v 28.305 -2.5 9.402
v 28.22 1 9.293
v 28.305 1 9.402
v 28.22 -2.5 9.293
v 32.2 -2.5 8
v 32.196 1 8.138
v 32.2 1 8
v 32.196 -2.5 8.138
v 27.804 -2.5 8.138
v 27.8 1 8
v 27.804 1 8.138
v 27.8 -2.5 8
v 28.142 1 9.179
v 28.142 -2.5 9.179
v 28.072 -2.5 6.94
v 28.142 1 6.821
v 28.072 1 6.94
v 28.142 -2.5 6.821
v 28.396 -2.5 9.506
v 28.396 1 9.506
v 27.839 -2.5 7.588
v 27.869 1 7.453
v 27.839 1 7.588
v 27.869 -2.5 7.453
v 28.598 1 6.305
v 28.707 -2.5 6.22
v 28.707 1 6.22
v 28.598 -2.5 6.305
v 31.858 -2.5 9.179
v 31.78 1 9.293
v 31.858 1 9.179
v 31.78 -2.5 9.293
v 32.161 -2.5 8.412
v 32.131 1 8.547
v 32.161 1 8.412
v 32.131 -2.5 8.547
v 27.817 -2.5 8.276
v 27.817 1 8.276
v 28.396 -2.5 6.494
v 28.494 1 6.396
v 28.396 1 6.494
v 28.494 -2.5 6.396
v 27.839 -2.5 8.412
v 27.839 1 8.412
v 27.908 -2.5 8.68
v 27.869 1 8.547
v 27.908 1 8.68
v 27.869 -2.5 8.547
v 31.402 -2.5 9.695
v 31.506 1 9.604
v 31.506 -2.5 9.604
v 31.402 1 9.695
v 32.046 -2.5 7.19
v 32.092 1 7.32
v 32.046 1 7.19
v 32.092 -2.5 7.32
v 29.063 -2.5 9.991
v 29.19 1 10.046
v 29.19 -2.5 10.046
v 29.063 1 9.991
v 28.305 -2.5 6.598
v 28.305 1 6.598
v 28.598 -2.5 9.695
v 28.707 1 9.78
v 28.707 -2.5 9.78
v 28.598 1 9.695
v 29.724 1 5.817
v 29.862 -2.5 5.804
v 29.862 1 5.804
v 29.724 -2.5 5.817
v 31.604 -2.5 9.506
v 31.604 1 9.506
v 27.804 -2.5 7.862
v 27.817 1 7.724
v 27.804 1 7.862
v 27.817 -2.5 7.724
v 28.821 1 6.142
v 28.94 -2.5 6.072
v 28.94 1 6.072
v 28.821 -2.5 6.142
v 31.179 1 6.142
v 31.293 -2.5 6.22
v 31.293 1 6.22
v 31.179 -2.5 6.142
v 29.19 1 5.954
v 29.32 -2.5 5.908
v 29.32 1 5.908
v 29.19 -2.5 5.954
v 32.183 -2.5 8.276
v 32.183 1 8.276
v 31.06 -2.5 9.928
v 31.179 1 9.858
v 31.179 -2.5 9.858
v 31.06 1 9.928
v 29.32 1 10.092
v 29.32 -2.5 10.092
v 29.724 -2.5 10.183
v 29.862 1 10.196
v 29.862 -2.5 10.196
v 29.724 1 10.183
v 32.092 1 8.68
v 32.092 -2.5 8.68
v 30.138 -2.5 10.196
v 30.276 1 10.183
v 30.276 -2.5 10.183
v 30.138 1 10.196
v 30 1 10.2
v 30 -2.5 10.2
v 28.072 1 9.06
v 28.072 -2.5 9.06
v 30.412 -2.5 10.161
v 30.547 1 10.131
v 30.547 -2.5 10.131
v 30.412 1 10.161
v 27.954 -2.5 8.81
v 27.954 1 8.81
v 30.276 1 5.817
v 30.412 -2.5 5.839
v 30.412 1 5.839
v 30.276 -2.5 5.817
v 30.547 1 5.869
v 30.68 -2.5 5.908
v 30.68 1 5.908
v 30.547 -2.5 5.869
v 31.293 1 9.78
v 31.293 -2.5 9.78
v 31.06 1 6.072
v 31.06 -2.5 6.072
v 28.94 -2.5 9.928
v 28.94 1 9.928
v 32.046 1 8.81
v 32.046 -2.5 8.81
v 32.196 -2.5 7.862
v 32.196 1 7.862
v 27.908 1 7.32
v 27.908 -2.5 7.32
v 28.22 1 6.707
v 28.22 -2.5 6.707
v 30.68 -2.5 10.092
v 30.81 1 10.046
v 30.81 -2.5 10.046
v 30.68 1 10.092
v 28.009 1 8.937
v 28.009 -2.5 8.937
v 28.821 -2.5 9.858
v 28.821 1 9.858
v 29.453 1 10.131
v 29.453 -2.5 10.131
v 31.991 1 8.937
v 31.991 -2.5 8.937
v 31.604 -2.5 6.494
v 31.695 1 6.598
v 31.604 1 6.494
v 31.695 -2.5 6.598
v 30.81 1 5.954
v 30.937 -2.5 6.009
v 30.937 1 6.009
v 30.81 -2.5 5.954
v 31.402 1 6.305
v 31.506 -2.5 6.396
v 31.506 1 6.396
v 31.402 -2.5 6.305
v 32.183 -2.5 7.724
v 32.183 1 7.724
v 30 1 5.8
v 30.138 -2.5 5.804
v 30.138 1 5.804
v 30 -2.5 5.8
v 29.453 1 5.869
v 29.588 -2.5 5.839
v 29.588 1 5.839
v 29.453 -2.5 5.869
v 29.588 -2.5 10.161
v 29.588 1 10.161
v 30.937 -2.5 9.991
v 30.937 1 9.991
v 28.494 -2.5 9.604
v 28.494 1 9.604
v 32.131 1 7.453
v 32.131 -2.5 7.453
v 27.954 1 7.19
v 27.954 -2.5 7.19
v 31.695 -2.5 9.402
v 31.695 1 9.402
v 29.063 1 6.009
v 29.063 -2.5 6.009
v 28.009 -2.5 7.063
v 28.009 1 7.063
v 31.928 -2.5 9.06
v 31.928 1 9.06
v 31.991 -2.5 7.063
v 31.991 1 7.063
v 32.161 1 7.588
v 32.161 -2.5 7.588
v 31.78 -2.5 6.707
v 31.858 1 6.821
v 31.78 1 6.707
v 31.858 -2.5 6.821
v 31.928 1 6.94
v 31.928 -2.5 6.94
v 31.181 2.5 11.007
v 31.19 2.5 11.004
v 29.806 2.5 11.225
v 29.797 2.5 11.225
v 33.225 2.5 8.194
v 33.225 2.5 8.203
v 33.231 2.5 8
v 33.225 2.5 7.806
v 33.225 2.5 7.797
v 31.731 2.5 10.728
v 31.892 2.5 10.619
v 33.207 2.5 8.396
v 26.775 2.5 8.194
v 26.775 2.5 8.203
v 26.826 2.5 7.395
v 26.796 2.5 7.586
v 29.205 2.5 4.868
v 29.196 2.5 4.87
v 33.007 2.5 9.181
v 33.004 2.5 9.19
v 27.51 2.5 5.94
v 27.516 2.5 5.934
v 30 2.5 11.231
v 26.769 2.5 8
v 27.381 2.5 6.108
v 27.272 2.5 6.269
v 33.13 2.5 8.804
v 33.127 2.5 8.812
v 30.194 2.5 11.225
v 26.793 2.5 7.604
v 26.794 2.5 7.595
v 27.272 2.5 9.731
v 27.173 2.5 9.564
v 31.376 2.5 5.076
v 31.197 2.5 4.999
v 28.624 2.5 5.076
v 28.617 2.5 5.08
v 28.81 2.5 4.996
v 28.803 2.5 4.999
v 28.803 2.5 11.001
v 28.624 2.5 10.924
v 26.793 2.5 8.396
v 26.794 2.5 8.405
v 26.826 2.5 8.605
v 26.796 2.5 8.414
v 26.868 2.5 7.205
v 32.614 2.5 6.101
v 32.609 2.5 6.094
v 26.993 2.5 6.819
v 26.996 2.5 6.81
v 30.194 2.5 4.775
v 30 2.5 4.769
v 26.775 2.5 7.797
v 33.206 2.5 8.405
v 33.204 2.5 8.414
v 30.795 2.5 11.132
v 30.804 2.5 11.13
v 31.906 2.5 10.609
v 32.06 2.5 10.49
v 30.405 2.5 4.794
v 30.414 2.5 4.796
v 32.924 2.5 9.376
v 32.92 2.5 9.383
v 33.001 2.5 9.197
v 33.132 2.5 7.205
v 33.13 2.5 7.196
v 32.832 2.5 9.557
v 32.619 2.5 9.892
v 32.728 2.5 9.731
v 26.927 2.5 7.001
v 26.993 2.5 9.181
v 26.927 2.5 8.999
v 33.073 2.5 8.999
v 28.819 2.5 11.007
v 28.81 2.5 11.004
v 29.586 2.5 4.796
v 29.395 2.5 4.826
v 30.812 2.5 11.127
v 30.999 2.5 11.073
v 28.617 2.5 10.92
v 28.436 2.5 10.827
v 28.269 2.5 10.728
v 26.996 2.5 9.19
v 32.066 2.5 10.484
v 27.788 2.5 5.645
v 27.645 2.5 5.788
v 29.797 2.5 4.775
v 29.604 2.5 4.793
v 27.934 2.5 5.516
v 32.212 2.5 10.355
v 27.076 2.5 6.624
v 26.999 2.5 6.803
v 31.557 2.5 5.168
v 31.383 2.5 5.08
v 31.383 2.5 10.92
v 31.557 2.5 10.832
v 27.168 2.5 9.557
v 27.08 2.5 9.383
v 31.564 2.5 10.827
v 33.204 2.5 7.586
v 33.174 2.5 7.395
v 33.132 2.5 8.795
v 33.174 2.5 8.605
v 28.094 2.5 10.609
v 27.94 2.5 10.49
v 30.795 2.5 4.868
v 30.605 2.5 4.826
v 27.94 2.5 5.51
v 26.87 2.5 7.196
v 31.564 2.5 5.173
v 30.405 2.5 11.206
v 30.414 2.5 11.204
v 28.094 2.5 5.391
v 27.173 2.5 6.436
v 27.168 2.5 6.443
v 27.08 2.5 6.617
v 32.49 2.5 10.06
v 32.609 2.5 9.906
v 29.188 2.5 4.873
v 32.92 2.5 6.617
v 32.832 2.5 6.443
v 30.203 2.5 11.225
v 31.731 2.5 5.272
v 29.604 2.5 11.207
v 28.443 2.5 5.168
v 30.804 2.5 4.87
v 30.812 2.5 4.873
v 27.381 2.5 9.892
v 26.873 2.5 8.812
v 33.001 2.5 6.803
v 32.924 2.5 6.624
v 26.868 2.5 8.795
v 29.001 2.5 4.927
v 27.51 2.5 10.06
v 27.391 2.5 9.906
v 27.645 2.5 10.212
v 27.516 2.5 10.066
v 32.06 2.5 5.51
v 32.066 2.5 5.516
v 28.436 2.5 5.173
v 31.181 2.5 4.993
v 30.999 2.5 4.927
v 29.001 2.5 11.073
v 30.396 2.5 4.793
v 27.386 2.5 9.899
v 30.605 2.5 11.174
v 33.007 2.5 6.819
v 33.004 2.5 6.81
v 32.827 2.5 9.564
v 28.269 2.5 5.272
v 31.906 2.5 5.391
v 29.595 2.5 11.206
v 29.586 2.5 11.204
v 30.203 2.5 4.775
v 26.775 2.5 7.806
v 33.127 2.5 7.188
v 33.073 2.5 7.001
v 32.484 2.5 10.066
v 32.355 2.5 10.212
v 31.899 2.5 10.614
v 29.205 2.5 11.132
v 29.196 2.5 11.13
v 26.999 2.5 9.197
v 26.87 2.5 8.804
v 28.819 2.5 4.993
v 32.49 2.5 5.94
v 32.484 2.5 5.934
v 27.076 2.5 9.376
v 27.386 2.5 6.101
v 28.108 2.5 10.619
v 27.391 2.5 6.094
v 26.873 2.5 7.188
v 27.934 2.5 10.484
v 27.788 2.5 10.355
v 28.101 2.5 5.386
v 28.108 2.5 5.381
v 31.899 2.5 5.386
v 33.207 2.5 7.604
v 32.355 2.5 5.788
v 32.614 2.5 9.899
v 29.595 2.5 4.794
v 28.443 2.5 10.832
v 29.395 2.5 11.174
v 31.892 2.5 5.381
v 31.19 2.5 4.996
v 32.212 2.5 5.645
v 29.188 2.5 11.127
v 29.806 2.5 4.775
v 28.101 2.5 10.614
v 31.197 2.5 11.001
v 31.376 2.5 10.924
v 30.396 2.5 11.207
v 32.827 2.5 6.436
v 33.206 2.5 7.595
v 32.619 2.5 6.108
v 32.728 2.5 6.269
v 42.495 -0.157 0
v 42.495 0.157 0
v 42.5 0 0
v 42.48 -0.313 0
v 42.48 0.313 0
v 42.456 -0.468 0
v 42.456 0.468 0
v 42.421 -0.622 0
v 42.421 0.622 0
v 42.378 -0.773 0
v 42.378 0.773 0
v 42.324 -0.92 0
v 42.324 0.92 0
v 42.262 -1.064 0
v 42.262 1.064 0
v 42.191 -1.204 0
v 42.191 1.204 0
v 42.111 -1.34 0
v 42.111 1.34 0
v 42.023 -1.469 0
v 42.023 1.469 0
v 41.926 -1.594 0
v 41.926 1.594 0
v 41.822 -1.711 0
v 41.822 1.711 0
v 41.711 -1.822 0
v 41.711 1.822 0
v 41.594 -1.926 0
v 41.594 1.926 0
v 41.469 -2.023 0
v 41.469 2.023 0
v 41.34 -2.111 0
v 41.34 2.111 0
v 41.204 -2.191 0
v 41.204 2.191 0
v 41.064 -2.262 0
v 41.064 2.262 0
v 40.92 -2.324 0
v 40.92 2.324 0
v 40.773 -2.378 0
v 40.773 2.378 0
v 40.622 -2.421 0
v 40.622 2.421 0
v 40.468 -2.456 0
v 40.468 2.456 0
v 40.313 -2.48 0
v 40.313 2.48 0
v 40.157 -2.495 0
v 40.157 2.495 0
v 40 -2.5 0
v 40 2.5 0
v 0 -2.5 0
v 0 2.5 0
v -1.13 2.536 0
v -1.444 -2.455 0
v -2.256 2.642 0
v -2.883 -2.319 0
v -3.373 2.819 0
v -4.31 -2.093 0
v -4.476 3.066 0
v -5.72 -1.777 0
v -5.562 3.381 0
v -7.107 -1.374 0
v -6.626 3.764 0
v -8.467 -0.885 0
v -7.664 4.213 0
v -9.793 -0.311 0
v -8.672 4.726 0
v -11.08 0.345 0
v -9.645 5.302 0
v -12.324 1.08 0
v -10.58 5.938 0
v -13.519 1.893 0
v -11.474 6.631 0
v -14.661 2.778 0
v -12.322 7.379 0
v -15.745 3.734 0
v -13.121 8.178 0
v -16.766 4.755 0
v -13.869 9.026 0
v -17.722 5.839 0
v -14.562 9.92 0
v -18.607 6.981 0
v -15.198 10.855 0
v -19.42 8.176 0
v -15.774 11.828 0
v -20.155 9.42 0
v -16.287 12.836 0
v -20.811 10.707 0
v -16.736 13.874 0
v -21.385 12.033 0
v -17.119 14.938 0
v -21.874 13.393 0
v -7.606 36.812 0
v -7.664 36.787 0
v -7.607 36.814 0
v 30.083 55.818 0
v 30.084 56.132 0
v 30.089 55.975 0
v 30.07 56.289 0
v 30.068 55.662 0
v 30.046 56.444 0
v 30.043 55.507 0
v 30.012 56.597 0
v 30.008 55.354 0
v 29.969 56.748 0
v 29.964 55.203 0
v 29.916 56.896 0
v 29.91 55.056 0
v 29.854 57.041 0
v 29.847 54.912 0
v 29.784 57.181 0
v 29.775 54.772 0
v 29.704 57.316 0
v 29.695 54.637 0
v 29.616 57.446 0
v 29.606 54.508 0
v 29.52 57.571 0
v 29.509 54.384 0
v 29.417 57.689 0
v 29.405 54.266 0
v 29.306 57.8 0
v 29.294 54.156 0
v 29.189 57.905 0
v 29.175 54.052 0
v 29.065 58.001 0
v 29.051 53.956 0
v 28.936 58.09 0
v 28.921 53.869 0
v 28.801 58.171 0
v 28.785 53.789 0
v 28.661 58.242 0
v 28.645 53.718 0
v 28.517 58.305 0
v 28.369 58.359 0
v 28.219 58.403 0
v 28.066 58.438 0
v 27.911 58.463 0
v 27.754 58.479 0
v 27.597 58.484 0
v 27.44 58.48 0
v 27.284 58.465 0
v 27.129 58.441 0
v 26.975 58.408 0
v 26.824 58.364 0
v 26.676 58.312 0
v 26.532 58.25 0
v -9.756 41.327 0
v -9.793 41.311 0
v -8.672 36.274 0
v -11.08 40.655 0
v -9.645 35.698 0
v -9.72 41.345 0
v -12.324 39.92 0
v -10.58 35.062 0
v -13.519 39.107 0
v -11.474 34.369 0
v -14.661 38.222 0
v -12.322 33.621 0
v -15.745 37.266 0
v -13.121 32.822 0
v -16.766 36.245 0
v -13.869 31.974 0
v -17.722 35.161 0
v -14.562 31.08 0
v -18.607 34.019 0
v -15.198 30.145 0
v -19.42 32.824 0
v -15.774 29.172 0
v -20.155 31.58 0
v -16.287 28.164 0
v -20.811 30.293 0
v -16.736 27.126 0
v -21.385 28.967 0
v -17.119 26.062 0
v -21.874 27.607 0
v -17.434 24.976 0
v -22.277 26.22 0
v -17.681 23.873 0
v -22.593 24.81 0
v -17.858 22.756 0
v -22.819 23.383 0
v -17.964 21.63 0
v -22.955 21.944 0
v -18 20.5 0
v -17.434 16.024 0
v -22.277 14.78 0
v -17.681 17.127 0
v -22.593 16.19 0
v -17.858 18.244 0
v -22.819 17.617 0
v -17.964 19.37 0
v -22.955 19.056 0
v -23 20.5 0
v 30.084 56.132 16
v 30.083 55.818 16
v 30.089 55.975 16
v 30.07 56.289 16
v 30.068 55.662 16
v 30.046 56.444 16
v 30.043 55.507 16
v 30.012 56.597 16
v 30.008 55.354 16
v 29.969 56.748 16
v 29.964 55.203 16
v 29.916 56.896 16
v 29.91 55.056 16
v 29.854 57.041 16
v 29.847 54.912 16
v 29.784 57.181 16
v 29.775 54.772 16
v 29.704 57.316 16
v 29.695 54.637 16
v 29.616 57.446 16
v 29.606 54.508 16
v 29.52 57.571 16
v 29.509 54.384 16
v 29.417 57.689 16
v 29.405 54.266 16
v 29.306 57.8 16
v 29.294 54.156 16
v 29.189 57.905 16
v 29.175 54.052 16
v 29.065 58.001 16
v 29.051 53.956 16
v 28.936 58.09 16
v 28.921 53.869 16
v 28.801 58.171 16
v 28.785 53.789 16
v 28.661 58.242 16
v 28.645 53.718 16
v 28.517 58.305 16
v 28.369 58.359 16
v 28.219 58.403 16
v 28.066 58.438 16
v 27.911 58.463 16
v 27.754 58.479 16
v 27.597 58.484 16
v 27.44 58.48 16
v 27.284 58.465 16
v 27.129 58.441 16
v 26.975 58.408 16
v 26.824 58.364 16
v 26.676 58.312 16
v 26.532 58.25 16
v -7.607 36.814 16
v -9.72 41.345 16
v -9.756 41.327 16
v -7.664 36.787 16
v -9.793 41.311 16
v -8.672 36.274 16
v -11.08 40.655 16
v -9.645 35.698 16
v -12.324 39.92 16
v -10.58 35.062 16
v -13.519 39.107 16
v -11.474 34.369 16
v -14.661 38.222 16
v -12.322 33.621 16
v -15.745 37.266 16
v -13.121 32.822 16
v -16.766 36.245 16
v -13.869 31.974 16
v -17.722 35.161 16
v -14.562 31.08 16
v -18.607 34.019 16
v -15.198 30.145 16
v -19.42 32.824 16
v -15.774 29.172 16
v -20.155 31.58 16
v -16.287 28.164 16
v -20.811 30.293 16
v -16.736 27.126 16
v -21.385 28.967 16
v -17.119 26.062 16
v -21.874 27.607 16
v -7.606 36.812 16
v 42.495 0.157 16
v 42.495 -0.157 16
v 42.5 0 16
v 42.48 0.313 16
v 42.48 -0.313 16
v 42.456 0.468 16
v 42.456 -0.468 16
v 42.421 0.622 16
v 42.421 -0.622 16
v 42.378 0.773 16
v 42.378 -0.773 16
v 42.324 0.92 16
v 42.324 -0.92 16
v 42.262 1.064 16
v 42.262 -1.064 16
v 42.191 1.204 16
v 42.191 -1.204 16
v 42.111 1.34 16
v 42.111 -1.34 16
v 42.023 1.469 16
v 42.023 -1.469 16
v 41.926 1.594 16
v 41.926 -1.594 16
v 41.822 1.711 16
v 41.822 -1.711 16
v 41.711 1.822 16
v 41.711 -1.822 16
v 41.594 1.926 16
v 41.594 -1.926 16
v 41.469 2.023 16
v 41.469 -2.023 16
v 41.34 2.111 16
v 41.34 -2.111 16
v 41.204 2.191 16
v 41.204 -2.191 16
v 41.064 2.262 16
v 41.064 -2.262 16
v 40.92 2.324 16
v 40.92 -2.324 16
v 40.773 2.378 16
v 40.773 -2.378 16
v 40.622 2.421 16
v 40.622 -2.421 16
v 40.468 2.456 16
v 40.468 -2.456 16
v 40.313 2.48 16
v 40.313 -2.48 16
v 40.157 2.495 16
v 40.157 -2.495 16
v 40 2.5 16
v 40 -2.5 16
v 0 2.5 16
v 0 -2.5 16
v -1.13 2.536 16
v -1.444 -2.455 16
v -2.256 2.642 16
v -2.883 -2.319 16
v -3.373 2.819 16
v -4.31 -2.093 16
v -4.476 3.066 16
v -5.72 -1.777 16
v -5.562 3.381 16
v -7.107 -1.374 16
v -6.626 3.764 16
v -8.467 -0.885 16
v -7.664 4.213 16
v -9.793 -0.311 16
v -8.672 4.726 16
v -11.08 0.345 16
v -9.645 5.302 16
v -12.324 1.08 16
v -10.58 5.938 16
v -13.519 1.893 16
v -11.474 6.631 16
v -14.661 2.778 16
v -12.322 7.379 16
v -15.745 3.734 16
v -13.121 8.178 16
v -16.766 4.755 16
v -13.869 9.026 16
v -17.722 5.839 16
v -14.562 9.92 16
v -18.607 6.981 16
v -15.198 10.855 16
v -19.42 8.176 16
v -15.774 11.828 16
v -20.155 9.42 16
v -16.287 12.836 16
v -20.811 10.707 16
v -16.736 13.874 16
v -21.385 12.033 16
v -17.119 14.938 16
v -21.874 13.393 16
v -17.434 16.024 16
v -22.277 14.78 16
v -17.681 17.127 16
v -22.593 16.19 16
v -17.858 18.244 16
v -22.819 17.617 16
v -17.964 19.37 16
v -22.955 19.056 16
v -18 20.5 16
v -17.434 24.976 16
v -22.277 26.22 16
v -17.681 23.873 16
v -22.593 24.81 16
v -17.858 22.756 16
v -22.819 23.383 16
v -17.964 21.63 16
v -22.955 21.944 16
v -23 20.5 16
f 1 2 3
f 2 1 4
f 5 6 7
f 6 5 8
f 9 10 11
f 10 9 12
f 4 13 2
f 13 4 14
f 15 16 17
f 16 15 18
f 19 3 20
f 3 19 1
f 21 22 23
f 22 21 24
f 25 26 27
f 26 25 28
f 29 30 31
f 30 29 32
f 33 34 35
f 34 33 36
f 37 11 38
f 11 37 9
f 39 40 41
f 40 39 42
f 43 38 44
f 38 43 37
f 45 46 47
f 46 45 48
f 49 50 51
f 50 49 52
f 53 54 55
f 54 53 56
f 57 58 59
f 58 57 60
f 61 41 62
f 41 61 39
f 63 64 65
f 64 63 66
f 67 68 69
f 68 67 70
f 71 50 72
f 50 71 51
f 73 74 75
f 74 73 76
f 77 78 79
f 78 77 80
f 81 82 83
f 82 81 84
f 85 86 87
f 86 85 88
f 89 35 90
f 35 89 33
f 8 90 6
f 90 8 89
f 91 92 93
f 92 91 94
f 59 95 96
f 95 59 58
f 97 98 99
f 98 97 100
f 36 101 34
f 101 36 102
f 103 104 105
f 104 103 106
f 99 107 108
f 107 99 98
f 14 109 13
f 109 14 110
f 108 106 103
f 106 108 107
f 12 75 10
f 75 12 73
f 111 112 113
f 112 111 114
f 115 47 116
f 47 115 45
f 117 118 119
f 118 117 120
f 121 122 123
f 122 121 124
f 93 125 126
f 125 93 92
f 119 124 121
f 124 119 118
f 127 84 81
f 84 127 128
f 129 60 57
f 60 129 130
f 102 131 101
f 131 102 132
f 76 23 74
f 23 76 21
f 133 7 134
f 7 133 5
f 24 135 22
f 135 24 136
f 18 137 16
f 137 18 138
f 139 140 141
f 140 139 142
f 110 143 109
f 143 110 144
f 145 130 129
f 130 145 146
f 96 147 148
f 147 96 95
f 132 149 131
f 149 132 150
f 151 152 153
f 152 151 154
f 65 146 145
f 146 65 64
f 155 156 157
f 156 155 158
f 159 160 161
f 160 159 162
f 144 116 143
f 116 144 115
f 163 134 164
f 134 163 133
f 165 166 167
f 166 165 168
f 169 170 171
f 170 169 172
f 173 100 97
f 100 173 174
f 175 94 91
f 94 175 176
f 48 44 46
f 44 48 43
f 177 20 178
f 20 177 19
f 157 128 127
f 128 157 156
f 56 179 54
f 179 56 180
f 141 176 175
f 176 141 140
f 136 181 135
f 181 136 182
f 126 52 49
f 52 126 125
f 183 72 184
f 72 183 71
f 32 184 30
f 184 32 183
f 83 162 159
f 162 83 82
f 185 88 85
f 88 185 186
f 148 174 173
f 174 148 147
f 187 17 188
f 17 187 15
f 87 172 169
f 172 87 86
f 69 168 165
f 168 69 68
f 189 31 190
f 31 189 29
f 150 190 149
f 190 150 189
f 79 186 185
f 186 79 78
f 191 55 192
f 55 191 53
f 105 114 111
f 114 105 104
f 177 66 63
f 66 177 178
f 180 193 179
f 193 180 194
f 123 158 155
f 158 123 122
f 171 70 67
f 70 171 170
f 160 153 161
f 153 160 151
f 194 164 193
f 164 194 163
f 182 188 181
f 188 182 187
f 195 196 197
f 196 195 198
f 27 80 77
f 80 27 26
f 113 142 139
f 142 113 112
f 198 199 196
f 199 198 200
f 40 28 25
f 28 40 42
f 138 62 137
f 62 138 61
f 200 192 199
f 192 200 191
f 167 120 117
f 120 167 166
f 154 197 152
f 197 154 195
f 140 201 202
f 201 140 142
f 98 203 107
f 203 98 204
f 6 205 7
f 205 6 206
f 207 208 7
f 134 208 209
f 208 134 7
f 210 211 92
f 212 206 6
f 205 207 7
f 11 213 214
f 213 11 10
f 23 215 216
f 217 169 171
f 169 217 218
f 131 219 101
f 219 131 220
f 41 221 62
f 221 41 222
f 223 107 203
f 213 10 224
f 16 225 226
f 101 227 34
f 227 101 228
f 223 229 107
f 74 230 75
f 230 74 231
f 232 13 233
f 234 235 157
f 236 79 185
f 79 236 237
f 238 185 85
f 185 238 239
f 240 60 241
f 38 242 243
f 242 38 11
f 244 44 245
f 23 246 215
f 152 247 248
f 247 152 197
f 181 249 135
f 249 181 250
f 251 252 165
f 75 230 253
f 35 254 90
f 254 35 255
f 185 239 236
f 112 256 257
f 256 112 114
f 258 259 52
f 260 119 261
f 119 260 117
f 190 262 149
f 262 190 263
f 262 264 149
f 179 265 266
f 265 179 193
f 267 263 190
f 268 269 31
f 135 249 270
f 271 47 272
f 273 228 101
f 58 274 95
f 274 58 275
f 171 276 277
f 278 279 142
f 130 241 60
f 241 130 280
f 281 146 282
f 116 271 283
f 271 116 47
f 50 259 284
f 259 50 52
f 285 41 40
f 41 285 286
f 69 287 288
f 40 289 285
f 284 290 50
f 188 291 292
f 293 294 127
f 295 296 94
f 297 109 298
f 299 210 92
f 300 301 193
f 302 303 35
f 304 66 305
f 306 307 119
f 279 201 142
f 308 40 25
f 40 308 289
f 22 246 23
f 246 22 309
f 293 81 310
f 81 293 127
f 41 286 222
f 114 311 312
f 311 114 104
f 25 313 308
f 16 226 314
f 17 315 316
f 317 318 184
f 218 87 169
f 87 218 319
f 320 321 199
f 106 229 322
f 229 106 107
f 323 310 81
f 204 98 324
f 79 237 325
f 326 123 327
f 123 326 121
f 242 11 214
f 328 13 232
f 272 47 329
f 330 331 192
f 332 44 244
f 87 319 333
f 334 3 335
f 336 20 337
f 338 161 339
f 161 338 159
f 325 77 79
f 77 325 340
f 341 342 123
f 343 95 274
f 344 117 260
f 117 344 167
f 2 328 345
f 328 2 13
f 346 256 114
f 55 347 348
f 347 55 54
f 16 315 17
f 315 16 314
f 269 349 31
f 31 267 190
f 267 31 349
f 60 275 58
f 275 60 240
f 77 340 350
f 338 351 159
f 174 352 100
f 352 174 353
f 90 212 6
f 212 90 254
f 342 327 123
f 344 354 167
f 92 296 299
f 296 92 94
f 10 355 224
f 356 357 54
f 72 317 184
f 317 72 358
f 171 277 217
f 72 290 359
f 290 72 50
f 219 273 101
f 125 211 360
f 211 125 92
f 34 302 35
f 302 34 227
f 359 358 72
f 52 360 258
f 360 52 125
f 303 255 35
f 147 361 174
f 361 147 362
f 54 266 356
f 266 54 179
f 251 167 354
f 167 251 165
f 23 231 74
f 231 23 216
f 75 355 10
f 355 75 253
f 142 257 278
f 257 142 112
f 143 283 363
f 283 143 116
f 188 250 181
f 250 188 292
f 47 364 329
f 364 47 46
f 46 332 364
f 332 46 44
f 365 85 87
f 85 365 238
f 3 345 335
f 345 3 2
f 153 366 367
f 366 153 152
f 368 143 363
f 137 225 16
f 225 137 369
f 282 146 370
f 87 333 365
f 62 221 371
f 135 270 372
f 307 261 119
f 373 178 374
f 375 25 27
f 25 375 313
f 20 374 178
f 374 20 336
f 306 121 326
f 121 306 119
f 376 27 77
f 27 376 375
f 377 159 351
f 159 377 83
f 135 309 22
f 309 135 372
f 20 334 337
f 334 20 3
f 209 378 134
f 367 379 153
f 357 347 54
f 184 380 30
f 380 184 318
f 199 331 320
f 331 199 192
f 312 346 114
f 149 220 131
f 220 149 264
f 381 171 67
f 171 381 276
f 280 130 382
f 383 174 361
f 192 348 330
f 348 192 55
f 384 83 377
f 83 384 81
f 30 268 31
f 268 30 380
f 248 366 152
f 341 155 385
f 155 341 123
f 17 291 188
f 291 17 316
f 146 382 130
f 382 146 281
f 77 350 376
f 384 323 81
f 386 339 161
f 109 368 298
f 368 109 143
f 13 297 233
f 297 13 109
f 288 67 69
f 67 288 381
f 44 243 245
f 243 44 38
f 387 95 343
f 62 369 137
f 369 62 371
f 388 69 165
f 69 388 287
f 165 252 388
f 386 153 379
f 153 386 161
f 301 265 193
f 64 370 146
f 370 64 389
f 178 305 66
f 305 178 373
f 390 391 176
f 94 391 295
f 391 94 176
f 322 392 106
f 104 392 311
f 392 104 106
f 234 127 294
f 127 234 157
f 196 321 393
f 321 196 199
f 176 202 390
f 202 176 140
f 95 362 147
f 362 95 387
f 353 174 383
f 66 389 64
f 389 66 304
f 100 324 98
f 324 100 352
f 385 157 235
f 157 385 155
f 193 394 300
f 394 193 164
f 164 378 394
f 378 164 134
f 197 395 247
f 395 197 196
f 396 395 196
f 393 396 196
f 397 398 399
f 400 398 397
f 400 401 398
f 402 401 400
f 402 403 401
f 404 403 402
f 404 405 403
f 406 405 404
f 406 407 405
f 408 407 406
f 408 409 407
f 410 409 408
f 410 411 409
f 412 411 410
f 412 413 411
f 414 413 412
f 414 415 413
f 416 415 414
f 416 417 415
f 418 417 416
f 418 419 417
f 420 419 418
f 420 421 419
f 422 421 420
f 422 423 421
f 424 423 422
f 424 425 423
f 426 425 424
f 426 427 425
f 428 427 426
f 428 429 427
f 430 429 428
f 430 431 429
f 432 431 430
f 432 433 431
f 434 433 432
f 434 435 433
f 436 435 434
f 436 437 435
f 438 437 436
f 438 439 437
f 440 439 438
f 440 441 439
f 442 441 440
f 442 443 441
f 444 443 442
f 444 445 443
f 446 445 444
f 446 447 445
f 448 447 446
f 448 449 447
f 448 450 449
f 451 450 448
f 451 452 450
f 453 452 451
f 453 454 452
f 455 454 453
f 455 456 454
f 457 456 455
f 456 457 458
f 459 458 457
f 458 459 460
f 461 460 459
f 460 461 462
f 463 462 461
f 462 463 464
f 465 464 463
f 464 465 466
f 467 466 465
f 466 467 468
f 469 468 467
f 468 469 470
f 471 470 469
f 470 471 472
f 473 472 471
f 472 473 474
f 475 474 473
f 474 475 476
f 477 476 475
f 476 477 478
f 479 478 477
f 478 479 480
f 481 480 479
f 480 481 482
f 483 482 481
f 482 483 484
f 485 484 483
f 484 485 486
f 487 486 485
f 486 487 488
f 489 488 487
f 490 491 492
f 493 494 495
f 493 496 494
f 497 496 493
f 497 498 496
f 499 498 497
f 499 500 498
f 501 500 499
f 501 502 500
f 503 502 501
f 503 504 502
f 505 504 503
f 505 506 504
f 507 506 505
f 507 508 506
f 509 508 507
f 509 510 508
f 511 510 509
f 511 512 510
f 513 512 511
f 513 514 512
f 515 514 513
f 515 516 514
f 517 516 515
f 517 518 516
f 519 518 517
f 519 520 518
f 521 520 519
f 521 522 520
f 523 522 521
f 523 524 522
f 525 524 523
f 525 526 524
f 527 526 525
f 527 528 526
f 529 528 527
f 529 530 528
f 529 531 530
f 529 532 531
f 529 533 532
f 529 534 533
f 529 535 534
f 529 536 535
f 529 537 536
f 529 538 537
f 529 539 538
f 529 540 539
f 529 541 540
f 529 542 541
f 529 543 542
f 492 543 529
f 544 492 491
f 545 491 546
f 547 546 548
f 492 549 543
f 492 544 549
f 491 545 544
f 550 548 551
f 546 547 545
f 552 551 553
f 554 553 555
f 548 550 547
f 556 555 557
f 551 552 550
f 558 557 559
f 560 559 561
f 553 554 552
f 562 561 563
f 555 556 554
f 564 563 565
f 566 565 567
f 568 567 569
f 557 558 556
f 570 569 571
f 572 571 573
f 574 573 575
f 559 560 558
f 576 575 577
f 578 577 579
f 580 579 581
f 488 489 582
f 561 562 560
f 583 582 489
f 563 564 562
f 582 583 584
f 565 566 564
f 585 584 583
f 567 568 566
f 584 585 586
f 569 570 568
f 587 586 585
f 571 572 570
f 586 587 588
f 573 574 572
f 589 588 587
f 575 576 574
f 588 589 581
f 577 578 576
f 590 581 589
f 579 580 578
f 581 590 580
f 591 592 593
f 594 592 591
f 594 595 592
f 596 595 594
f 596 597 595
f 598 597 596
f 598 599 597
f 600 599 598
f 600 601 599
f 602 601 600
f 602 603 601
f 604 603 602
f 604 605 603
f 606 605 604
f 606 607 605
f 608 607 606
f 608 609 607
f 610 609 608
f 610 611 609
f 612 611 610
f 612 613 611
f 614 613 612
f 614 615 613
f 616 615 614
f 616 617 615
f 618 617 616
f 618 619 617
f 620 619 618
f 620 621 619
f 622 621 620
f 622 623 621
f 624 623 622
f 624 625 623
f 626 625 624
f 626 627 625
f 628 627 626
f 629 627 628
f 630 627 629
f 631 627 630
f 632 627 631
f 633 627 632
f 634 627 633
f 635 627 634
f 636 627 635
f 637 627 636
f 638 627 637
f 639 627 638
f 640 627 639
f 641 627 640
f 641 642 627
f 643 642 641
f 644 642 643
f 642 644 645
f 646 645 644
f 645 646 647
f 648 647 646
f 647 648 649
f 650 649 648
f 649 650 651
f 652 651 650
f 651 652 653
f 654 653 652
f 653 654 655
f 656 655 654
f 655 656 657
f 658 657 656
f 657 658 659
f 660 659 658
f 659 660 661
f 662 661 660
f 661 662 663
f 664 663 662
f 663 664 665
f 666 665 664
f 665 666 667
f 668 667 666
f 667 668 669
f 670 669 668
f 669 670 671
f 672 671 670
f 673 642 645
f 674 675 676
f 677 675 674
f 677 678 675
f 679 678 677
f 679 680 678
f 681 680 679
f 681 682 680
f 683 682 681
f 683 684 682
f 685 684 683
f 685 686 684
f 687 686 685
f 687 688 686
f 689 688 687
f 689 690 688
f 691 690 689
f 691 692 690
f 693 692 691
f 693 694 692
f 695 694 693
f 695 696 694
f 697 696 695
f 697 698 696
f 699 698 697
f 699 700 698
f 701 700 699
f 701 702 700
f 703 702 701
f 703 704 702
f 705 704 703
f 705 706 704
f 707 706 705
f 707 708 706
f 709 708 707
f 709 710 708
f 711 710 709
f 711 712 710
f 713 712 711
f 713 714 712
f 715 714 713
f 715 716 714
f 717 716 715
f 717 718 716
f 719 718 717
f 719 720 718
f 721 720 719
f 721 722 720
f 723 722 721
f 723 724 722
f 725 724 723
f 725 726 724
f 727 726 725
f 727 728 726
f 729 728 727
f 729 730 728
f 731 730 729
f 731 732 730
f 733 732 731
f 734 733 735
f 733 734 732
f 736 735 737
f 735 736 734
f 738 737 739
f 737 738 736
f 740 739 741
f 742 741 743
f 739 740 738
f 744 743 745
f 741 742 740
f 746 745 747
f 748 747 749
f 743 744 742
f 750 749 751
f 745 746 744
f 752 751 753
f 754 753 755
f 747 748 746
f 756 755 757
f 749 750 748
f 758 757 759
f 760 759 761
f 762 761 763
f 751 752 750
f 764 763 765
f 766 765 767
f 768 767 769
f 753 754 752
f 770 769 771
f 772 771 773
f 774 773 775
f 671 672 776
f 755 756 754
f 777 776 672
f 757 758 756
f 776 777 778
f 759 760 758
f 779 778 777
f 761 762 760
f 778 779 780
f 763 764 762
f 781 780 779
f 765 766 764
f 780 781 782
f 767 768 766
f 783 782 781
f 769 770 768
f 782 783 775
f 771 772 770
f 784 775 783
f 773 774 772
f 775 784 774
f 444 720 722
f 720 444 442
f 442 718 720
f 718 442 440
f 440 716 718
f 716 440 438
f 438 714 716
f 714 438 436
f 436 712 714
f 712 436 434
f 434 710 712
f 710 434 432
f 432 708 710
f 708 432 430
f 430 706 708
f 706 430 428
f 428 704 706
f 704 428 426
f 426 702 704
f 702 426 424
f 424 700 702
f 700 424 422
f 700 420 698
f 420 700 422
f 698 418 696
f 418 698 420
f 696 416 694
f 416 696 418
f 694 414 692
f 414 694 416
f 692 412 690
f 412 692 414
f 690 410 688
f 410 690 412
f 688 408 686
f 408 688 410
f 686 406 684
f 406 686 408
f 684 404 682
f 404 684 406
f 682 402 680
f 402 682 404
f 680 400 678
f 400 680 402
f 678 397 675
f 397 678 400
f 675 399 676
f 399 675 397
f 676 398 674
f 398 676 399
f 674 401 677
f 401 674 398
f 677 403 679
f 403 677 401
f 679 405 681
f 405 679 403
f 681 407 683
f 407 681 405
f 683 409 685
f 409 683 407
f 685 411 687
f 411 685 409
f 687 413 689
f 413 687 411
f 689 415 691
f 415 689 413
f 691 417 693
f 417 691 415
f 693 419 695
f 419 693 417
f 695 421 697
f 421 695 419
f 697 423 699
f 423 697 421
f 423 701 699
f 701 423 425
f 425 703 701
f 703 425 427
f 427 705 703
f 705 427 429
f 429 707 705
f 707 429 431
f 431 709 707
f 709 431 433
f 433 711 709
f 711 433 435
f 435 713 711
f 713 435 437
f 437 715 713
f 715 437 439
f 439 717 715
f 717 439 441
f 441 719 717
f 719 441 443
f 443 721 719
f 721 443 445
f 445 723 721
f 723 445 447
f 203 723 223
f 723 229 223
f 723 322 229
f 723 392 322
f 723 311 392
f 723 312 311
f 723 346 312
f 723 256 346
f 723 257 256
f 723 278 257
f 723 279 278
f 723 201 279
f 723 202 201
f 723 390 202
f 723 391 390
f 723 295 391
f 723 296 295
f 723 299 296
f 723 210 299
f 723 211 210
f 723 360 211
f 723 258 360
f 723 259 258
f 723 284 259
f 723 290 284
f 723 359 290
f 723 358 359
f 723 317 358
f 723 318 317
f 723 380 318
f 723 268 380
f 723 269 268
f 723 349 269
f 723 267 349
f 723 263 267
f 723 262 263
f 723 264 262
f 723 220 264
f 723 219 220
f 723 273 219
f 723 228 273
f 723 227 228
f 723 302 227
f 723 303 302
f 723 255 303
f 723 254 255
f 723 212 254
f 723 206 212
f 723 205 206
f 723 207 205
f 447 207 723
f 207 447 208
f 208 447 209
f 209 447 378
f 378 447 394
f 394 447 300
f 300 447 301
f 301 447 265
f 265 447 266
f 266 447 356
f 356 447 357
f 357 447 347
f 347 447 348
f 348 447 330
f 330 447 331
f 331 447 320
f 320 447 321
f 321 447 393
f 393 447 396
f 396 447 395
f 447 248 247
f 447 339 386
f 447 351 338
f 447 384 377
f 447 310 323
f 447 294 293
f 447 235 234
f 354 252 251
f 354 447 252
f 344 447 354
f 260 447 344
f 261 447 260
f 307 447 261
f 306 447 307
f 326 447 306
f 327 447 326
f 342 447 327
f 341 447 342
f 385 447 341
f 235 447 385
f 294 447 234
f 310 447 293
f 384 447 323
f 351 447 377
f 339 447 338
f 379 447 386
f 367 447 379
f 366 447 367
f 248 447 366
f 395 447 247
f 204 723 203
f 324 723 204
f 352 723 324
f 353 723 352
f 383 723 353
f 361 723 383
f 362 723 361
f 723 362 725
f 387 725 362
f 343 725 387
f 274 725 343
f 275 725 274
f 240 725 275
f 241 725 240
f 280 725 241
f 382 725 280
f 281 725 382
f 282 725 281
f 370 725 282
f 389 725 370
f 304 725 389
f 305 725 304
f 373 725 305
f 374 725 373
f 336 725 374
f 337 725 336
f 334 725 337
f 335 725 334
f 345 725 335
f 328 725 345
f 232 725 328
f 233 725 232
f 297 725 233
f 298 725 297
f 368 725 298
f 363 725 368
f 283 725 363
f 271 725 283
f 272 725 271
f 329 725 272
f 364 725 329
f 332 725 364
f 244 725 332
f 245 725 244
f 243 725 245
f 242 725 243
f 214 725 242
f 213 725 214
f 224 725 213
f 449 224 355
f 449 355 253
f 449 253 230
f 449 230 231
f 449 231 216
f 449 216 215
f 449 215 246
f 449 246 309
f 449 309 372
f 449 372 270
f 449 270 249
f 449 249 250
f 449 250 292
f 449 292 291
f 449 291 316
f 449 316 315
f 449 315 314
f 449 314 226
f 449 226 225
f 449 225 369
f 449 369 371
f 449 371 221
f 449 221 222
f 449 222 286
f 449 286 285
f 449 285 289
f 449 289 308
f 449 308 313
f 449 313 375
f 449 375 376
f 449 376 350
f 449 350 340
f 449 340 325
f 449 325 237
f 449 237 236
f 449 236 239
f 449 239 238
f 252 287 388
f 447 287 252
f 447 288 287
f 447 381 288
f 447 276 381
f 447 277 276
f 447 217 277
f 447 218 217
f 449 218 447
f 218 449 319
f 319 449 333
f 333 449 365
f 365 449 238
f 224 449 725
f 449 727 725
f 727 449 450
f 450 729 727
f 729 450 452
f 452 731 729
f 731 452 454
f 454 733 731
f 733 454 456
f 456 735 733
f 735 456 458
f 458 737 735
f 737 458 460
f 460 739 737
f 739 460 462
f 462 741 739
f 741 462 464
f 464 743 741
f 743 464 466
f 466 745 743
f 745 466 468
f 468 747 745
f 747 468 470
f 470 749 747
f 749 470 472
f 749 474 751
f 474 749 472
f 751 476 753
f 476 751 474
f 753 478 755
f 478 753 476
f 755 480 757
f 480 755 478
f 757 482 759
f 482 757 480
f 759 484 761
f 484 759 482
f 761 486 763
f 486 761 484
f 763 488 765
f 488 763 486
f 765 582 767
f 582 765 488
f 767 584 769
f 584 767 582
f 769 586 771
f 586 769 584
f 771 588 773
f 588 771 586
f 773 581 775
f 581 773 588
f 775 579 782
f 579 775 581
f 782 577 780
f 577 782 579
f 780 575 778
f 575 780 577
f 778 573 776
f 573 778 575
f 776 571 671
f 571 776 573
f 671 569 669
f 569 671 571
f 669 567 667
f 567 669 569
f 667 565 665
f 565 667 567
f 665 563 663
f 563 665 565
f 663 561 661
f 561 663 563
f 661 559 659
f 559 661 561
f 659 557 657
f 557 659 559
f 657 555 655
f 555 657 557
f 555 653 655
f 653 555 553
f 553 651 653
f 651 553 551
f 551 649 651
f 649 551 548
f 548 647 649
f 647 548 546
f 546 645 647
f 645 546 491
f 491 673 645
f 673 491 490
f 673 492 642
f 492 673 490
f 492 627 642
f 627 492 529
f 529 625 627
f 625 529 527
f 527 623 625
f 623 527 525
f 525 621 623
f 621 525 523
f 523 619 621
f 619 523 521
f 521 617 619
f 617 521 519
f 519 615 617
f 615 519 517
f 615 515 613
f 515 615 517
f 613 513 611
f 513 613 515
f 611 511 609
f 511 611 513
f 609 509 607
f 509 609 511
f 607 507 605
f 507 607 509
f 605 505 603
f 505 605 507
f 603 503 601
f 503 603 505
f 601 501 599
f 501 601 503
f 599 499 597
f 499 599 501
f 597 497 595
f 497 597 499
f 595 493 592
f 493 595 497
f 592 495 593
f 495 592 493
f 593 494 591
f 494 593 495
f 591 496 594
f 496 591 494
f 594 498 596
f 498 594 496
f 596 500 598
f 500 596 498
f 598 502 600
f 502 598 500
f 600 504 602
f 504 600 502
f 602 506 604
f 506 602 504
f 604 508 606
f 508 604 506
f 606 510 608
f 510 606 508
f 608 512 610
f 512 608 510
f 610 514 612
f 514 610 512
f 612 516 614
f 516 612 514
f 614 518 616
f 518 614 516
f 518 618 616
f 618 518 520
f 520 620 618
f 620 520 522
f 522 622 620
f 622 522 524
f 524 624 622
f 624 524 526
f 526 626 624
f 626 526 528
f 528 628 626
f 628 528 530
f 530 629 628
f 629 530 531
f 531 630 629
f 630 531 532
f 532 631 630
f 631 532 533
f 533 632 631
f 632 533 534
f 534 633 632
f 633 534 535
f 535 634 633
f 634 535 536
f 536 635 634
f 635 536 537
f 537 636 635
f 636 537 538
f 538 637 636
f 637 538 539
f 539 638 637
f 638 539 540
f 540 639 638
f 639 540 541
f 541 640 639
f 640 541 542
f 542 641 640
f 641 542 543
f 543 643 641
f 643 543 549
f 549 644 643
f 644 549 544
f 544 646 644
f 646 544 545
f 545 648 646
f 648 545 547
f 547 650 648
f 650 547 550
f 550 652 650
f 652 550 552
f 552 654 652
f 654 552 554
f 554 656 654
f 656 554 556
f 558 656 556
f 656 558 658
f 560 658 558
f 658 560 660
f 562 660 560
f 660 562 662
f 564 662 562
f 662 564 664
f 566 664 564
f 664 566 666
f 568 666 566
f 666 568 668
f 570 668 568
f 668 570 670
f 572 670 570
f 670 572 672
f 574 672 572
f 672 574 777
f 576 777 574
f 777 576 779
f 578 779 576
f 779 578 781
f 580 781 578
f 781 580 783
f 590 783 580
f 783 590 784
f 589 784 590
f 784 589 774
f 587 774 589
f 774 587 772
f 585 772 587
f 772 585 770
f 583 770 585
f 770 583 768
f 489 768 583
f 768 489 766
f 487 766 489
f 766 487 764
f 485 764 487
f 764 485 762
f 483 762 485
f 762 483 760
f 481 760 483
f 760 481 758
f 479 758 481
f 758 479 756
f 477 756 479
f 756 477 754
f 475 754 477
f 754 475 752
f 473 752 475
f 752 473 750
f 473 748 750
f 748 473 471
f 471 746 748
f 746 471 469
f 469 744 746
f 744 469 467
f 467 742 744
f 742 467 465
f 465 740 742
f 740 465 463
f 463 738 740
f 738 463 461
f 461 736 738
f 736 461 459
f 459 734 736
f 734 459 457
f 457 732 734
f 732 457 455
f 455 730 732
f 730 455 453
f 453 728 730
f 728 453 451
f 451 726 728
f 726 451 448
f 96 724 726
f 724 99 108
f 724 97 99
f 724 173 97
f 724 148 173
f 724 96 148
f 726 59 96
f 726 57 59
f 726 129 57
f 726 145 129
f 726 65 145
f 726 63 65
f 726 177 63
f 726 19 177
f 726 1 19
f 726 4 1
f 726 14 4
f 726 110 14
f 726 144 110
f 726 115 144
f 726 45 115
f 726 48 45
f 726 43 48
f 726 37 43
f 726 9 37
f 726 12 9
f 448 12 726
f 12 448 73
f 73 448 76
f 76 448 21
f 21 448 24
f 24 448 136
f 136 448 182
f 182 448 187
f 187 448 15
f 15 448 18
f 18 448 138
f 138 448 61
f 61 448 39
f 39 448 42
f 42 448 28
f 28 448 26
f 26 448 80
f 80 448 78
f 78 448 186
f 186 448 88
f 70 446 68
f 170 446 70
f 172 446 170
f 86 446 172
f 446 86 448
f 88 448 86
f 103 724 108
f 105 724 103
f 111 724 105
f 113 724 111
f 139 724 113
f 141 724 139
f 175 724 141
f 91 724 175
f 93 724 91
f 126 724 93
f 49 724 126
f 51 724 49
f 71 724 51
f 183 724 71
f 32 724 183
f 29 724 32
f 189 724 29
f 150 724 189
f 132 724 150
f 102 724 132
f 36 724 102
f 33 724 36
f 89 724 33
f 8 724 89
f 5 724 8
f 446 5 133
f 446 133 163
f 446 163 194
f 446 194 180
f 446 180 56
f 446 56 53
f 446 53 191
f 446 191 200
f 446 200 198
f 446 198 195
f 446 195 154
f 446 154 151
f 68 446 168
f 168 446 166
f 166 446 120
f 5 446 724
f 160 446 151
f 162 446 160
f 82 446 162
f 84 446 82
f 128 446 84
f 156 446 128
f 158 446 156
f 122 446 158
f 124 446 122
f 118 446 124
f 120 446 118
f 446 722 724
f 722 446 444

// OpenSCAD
$fn=100;

thickness = 5;
pole_radius = 18;
screw_hole_radius = 2.2;
curve_angle = 25;
total_width = 16;

difference () {
  linear_extrude (total_width) {
    hull () {
      circle (thickness/2);
      translate ([40,0,0]) circle (thickness/2);
    }
    translate ([0,pole_radius + thickness/2,0])
    difference () {
      circle (pole_radius + thickness);
      circle (pole_radius);
      translate ([0,-50,0])
        square (100);
      rotate(curve_angle)
        square(100);
    }
    translate([0,pole_radius+thickness/2,0])
    rotate(curve_angle)
      hull () {
        translate ([0, pole_radius + thickness/2, 0]) circle(thickness/2);
        translate ([40, pole_radius + thickness/2, 0]) circle(thickness/2);
      }
  }
  
  translate ([30, 0, total_width/2])
  rotate ([270,0,0]) {
    translate ([0,0,-15]) linear_extrude (total_width)
      circle (screw_hole_radius);
    translate ([0,0,thickness/2 - 1.5])
    linear_extrude (1.6, scale=1.5)
      circle (screw_hole_radius);
  }
}
